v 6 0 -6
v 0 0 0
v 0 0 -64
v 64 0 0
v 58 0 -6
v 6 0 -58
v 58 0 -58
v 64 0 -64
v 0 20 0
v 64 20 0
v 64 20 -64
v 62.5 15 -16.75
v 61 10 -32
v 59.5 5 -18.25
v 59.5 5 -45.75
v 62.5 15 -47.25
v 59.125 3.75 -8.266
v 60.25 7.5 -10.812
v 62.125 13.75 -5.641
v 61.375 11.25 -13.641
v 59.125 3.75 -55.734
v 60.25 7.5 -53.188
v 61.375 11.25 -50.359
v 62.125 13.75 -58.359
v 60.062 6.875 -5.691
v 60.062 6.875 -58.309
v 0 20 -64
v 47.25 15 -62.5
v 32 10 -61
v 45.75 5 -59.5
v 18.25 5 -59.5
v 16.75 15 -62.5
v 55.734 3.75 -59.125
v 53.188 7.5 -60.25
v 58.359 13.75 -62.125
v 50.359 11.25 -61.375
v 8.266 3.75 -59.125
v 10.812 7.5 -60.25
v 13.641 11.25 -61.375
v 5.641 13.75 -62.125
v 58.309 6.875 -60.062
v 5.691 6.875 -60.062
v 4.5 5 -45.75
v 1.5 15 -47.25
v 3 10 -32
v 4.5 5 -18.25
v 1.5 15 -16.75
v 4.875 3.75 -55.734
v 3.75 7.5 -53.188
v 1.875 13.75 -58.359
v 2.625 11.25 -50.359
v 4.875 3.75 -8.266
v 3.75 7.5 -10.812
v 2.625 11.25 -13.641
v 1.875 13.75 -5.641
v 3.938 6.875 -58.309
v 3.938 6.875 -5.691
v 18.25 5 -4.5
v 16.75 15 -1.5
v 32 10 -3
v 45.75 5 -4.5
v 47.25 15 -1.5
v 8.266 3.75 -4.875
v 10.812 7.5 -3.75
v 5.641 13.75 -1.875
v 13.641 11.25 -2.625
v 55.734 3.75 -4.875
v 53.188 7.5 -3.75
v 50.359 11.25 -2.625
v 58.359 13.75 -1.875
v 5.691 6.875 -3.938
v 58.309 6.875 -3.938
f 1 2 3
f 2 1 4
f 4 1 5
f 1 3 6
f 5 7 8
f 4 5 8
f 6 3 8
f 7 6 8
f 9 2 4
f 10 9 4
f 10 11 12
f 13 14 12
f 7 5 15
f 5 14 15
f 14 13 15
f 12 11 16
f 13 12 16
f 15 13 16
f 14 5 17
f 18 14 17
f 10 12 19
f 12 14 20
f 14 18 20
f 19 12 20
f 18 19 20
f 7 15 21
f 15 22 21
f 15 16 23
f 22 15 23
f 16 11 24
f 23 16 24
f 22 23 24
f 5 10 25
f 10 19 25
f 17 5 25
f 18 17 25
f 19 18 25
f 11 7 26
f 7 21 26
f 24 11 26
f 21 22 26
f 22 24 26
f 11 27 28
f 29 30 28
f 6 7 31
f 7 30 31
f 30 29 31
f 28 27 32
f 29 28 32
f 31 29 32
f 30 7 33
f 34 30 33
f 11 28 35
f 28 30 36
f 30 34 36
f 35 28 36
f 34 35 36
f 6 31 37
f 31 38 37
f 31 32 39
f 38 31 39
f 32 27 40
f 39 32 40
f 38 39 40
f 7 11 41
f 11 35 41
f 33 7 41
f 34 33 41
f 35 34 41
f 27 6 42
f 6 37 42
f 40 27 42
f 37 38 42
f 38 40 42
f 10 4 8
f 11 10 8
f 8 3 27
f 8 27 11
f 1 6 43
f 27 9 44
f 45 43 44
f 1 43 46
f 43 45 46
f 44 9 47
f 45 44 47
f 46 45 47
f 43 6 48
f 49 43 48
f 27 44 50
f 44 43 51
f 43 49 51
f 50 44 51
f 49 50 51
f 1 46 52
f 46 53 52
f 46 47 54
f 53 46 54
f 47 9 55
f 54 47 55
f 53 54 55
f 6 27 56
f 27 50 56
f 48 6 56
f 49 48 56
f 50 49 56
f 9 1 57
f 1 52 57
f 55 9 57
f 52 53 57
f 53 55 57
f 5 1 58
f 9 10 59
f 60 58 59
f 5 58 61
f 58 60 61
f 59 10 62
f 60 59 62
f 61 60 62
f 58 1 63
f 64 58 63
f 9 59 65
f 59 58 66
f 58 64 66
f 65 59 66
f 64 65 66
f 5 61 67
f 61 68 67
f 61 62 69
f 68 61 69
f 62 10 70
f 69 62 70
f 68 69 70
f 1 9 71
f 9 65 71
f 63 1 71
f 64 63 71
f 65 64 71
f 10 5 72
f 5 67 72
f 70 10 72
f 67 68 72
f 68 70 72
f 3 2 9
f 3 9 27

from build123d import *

# Parameters (mm, degrees)
SKETCH_1_W      = 64
SKETCH_1_H      = 64
EXTRUDE_1_DEPTH = 20


with BuildPart() as part:
    # 草图1 → 凸台-拉伸1 (new body)
    with BuildSketch(Plane(origin=(0, 0, 0), x_dir=(1, 0, 0), z_dir=(0, 1, 0))):
        with Locations((32, 32)):
            Rectangle(SKETCH_1_W, SKETCH_1_H)
    extrude(amount=EXTRUDE_1_DEPTH)

    # 草图3 → 切除-放样1 section 0
    with BuildSketch(Plane.XZ):
        with BuildLine():
            Line((6, -6), (58, -6))
            Line((58, -6), (58, -58))
            Line((58, -58), (6, -58))
            Line((6, -58), (6, -6))
        make_face()
    # 草图2 → 切除-放样1 section 1
    with BuildSketch(Plane(origin=(0, 20, 0), x_dir=(1, 0, 0), z_dir=(0, 1, 0))):
        with BuildLine():
            Line((0, 64), (0, 0))
            Line((0, 0), (64, 0))
            Line((64, 0), (64, 64))
            Line((64, 64), (0, 64))
        make_face()
    loft(mode=Mode.SUBTRACT)


solid = part.part
